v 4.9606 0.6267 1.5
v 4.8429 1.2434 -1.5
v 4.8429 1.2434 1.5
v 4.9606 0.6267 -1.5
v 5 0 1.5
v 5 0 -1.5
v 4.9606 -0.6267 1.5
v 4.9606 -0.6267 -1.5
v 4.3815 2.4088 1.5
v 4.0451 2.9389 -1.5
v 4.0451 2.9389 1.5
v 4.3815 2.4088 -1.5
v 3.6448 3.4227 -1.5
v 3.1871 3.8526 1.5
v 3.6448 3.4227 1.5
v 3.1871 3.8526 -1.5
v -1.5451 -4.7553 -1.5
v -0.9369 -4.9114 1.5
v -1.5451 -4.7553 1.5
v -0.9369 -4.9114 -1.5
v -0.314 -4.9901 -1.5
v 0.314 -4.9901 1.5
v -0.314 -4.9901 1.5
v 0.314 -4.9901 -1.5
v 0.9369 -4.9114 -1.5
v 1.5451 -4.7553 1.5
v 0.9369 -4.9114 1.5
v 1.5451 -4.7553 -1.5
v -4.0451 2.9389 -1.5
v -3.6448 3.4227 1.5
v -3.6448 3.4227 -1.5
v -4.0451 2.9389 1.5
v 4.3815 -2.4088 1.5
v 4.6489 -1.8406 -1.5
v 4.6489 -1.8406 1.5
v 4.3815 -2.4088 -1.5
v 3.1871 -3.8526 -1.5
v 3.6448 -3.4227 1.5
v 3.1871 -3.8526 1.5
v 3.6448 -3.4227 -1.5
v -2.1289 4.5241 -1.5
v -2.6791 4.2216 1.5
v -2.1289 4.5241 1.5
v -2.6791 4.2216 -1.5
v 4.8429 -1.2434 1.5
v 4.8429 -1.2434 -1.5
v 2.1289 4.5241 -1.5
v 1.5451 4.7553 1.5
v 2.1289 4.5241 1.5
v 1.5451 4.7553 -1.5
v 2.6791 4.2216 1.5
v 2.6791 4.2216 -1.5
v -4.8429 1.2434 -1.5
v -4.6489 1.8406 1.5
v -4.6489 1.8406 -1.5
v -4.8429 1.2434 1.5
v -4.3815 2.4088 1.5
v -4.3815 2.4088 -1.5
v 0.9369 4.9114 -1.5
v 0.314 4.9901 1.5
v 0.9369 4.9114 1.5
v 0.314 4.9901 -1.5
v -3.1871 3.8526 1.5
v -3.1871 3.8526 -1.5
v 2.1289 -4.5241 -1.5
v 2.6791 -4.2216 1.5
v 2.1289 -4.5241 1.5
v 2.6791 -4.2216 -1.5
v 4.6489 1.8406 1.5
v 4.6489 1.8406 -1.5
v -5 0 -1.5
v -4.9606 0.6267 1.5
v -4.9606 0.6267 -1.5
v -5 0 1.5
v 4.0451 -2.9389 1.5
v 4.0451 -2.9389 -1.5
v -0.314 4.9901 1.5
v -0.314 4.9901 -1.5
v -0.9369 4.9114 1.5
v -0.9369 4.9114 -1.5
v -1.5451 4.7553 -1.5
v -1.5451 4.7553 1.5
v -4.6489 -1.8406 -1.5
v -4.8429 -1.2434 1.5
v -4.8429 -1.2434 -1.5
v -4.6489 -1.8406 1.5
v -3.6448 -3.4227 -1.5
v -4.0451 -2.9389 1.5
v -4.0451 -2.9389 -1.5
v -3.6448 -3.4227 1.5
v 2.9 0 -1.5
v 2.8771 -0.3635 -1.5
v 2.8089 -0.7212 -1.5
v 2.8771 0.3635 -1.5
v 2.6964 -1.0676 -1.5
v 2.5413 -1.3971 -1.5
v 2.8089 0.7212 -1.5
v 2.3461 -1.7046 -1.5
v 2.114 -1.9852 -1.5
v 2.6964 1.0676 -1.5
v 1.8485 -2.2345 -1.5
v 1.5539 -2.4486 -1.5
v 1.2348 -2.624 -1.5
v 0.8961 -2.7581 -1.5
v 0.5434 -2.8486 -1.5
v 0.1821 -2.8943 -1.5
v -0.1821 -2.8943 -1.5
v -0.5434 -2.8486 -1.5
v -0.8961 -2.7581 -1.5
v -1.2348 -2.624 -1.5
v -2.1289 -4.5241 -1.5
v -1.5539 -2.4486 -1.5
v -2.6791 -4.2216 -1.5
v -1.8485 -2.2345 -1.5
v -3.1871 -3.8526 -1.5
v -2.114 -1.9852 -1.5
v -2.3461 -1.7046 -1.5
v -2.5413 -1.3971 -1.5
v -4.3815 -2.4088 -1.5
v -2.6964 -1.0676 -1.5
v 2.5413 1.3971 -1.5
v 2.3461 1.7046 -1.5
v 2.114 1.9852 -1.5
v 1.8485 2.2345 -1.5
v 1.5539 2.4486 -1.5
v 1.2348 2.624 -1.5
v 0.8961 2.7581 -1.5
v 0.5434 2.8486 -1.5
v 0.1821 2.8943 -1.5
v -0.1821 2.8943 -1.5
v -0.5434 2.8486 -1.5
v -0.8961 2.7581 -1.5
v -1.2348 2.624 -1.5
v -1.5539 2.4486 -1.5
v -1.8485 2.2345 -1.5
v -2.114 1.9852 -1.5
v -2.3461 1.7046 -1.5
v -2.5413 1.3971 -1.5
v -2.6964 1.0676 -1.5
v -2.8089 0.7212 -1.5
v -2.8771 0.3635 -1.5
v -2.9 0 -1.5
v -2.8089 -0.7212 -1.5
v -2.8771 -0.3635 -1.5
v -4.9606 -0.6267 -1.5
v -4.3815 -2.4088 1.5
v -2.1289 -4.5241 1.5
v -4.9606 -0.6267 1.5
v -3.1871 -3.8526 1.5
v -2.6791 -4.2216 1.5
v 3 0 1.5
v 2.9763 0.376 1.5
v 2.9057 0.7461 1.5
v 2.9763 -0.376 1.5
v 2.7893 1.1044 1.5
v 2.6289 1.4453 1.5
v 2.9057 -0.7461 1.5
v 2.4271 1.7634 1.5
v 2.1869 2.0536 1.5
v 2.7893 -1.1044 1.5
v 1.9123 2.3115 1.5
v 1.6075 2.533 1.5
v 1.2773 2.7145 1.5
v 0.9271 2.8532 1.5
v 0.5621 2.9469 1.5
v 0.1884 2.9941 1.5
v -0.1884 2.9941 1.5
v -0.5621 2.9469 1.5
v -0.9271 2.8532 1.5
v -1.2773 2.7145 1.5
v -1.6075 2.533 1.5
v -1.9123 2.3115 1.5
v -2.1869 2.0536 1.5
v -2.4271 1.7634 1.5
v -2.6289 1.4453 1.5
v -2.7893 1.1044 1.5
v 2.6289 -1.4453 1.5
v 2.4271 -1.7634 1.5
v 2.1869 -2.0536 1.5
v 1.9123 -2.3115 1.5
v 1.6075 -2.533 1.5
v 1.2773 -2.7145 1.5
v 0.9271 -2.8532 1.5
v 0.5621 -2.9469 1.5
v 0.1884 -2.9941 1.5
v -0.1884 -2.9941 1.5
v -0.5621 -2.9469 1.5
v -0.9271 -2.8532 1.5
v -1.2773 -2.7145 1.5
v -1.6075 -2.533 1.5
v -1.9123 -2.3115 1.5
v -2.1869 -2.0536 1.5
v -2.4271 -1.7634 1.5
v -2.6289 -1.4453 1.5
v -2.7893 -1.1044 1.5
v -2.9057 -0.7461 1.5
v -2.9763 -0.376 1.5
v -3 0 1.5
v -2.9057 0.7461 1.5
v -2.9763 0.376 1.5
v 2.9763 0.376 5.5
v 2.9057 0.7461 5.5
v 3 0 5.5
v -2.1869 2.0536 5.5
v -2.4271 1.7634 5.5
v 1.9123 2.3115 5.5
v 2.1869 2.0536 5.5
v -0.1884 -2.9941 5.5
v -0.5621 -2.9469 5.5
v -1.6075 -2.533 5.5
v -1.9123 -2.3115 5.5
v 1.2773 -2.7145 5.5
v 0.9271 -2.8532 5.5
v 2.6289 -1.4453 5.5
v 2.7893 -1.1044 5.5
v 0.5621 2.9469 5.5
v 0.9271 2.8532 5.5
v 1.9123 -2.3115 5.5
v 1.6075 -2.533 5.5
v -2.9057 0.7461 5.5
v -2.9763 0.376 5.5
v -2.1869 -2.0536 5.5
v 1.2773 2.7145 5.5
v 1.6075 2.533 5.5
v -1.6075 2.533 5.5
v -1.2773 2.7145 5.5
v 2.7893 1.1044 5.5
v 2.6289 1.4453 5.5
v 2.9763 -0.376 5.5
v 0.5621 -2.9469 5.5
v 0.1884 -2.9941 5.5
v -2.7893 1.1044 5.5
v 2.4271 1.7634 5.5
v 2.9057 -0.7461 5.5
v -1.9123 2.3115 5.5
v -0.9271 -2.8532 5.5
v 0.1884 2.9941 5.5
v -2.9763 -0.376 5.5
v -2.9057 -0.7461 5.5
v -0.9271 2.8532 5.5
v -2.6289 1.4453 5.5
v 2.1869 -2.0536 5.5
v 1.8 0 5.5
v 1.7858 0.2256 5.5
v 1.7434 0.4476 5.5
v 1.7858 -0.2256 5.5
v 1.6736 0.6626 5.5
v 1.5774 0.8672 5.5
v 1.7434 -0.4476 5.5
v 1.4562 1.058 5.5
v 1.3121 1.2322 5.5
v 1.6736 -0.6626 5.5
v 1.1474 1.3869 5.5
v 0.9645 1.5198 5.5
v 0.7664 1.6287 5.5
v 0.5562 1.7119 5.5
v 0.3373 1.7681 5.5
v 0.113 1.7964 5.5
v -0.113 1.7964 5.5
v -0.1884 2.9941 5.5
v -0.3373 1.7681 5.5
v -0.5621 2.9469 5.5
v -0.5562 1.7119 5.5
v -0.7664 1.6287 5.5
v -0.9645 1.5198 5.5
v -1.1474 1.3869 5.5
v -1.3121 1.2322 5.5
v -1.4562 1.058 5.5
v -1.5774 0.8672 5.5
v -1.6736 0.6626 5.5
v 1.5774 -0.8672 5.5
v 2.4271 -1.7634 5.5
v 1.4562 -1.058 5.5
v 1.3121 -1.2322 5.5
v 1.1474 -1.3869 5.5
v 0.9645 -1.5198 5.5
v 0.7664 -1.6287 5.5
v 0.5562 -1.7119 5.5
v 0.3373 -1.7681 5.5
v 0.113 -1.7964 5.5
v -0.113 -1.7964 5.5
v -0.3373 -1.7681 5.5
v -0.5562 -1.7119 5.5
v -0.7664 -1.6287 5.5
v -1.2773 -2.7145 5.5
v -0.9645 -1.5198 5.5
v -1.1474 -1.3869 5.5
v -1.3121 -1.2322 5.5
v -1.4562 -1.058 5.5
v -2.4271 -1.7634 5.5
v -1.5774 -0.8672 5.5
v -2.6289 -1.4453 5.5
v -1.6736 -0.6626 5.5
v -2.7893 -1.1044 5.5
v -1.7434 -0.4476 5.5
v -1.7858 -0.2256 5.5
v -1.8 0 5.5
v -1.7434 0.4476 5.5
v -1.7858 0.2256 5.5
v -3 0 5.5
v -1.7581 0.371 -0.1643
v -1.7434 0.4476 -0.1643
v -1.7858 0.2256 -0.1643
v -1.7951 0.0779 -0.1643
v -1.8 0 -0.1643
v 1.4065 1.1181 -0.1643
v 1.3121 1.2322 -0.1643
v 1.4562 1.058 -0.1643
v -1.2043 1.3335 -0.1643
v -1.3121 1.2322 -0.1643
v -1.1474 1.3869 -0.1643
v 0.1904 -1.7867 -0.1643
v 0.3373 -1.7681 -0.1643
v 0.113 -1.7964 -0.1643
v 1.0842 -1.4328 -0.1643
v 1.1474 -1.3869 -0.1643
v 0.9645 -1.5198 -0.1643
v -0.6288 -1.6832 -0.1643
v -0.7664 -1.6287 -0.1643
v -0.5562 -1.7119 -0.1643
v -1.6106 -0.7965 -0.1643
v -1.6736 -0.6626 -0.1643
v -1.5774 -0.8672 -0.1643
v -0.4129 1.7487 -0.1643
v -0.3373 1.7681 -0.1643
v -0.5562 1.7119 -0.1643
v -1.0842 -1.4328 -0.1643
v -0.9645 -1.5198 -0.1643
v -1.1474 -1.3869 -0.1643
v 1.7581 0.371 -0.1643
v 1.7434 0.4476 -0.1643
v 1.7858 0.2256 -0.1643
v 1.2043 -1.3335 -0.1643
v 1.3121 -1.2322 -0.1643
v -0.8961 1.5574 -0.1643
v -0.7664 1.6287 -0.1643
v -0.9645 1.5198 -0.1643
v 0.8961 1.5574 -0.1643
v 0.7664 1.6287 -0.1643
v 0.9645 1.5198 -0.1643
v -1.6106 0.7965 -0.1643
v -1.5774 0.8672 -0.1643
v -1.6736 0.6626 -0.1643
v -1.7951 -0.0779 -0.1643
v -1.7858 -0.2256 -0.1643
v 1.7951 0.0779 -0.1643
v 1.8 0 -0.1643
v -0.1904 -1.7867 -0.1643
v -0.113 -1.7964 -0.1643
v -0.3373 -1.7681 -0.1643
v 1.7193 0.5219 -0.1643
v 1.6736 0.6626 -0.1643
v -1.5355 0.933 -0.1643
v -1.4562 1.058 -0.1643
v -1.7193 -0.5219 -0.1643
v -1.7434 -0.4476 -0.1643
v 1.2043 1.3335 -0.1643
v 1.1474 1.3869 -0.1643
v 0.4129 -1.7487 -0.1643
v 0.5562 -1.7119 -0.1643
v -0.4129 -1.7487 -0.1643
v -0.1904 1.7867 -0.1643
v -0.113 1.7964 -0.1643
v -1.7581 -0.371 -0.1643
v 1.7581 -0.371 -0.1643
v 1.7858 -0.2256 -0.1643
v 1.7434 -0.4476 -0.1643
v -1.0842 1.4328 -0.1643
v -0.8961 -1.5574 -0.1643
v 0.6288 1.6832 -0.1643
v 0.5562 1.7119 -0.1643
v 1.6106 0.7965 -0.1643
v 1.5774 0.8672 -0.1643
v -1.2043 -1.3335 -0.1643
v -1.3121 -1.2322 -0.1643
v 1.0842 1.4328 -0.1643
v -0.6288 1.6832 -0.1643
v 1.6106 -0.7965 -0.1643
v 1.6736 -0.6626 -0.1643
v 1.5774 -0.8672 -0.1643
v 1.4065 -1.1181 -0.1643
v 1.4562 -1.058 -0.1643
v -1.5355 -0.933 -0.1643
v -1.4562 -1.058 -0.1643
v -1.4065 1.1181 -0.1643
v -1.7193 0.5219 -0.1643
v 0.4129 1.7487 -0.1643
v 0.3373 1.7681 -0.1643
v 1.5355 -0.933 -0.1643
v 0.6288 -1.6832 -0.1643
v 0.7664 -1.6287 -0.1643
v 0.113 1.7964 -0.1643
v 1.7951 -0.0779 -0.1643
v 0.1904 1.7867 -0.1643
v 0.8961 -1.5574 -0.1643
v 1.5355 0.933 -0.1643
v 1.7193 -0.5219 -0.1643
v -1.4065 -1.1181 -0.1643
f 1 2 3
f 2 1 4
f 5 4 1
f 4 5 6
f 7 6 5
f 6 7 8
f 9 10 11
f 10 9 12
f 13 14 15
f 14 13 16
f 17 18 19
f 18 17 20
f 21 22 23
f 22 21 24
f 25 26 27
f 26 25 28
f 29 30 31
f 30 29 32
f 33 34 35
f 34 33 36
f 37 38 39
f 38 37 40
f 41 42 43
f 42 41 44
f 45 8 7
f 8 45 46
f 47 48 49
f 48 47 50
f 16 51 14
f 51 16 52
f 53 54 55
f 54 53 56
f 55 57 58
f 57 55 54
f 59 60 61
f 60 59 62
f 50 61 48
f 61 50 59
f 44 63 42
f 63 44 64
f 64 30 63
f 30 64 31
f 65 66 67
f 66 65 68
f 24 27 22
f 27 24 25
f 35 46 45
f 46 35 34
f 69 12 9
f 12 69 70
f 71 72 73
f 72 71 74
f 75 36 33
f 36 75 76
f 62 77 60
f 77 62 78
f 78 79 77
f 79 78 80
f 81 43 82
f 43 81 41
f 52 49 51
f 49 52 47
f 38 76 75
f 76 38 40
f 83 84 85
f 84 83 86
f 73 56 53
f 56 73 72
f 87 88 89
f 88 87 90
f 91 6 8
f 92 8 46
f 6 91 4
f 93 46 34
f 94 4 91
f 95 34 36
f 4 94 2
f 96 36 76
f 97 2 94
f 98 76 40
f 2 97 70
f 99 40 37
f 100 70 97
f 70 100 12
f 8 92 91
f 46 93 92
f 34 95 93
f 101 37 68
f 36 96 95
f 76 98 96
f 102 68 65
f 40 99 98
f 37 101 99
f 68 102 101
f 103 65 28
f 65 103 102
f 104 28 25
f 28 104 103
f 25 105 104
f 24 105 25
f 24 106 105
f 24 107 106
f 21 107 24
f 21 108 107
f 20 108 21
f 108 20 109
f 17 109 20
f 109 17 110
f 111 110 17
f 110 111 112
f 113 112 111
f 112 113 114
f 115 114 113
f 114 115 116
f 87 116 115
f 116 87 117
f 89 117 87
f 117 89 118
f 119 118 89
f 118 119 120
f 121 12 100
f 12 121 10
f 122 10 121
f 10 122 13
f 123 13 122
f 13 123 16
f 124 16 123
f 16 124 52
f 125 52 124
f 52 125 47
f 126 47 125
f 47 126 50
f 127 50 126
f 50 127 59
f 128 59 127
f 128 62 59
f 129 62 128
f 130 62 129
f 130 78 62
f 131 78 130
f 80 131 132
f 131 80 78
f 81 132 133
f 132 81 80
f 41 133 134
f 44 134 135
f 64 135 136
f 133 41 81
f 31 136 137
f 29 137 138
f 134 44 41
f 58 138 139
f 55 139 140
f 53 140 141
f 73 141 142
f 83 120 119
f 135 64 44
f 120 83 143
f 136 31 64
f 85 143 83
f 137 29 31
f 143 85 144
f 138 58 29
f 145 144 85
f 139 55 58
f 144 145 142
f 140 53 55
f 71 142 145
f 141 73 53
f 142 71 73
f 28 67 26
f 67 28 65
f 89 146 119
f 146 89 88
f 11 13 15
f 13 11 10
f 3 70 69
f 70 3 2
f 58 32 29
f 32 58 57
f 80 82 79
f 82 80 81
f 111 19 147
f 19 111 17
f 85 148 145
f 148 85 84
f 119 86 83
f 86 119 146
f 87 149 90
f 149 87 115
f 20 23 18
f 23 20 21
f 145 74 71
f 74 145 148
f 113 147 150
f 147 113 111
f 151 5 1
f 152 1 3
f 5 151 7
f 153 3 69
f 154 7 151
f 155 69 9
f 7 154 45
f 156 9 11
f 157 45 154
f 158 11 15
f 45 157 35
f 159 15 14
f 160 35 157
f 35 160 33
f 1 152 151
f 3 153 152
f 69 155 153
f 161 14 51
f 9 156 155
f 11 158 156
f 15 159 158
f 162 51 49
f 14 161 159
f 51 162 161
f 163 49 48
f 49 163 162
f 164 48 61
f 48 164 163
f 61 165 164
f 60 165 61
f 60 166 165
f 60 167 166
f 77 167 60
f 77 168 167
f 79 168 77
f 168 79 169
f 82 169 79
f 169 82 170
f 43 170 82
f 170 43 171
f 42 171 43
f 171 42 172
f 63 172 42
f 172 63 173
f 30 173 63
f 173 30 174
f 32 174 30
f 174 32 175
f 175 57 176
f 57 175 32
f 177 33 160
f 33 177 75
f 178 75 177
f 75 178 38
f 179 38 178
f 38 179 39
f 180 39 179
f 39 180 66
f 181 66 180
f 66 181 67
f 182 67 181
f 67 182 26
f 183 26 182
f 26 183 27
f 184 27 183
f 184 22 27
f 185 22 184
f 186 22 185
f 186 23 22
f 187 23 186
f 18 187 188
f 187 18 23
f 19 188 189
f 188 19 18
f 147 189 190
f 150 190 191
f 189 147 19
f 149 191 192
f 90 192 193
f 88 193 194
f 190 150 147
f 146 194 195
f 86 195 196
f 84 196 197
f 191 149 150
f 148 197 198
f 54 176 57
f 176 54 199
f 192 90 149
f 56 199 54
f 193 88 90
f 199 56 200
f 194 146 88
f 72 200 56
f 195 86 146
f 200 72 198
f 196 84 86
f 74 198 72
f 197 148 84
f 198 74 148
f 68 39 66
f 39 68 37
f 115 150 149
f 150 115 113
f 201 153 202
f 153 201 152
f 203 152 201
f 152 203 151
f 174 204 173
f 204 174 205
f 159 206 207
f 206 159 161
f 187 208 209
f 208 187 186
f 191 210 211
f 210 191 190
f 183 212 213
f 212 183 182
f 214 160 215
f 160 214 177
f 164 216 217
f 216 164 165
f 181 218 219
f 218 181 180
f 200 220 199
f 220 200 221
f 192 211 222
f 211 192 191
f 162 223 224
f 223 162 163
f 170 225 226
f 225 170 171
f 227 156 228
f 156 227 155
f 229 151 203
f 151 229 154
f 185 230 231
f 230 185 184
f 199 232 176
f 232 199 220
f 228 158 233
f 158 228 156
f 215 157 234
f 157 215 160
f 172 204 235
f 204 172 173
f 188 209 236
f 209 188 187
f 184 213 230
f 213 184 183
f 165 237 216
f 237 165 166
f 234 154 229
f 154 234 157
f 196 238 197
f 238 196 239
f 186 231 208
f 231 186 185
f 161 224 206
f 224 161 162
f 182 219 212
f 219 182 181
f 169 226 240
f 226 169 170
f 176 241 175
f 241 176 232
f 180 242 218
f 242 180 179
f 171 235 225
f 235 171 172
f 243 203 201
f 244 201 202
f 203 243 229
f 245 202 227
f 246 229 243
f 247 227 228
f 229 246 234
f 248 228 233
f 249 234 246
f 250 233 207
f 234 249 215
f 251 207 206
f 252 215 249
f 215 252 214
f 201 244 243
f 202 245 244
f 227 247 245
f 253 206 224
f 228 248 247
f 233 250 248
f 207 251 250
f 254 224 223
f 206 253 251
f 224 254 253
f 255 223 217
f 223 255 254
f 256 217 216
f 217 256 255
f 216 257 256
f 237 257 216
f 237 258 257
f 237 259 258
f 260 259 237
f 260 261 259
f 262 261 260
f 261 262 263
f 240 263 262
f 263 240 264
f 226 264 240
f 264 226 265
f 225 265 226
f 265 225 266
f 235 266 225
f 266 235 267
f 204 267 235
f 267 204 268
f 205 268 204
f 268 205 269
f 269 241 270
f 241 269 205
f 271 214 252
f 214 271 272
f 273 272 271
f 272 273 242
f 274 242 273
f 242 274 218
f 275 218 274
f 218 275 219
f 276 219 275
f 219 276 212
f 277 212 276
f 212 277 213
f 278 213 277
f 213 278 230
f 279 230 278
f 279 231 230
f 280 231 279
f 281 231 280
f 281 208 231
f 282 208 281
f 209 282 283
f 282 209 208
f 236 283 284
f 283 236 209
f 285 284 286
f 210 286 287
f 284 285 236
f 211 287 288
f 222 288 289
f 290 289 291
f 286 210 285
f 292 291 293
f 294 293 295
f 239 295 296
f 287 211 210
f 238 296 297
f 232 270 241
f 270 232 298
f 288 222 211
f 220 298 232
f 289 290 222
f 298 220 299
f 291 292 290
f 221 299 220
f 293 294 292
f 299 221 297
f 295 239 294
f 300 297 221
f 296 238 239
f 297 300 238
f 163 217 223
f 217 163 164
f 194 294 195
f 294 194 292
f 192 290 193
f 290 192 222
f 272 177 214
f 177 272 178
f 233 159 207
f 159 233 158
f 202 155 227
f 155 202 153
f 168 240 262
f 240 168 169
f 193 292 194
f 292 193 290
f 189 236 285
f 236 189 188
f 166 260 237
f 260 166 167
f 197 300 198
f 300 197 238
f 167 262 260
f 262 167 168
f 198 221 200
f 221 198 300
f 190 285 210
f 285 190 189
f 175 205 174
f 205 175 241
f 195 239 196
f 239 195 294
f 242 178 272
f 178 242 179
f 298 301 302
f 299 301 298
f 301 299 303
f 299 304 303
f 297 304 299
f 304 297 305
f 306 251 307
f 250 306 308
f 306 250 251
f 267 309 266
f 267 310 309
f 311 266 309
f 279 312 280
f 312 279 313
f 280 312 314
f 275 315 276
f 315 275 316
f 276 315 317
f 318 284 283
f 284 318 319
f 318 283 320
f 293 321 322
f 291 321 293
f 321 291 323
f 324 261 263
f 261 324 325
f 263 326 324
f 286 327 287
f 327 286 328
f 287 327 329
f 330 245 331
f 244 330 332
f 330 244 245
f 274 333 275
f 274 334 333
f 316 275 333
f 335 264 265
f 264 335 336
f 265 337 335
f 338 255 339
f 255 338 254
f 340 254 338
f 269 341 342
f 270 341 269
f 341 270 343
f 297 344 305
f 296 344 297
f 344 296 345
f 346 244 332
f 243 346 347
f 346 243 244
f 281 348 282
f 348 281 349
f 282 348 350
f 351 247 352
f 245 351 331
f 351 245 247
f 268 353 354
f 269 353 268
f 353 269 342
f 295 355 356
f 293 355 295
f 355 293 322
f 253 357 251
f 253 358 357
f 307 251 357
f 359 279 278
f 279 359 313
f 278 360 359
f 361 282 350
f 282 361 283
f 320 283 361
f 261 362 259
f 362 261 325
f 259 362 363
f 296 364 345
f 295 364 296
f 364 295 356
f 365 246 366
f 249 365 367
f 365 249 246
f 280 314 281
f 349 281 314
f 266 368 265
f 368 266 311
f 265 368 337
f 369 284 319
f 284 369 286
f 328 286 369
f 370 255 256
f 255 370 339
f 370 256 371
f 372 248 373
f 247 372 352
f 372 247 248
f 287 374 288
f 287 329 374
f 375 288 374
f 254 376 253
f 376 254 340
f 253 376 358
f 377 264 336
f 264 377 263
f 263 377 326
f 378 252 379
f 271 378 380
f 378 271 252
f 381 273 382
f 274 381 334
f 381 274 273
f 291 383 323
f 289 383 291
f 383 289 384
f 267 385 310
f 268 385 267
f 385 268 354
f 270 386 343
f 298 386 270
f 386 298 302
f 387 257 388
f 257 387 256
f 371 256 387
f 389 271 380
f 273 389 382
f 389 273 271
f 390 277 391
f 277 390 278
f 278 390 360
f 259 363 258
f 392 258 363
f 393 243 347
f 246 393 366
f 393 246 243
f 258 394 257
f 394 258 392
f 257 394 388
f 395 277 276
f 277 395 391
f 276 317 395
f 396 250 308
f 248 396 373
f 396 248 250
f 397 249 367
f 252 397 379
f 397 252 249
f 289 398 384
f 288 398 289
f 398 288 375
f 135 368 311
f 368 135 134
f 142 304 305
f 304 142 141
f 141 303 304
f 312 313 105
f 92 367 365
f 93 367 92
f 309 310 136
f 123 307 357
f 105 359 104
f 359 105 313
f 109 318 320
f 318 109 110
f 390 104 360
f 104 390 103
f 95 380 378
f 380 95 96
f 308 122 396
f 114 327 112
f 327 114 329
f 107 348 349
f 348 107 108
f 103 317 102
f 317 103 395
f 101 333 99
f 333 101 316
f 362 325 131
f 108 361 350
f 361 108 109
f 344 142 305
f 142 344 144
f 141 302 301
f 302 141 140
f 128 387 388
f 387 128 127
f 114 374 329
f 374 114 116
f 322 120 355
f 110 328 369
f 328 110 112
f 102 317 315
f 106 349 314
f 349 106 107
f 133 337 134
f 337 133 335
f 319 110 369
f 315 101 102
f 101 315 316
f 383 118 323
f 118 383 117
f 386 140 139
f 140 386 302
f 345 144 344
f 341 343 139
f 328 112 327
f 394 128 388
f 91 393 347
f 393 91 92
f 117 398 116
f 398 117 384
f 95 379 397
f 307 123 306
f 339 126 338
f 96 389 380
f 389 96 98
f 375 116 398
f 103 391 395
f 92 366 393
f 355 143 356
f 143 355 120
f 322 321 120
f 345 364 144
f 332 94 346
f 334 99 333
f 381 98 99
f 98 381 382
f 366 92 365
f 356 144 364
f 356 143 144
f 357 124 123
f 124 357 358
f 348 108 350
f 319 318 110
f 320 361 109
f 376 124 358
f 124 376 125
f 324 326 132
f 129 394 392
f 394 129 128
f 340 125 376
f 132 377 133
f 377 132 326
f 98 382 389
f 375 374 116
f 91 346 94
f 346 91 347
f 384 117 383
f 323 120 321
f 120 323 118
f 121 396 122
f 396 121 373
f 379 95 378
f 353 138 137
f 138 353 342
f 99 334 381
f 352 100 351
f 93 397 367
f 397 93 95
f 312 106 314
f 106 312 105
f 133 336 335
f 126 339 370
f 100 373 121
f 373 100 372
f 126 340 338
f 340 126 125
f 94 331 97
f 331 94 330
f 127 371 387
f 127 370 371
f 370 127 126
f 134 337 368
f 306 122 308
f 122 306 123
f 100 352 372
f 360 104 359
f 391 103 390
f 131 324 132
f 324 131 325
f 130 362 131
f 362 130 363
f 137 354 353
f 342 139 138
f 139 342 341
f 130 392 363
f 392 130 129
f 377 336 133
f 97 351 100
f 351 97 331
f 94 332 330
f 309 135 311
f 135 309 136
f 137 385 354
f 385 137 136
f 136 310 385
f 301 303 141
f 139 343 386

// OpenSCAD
$fn = 50;


difference() {
	union() {
		translate(v = [0, 0, -1.5000000000]) {
			cylinder(h = 3, r = 5.0000000000);
		}
		translate(v = [0, 0, -1.5000000000]) {
			cylinder(h = 7, r = 3.0000000000);
		}
	}
	union() {
		translate(v = [0, 0, -1.5000000000]) {
			rotate(a = [0, 180, 0]) {
				difference() {
					union() {
						translate(v = [0, 0, -7.0000000000]) {
							cylinder(h = 7, r = 1.5000000000);
						}
						translate(v = [0, 0, -7.0000000000]) {
							cylinder(h = 7, r = 1.8000000000);
						}
						translate(v = [0, 0, -1.7000000000]) {
							cylinder(h = 1.7000000000, r1 = 1.5000000000, r2 = 2.9000000000);
						}
						translate(v = [0, 0, -7.0000000000]) {
							cylinder(h = 7, r = 1.5000000000);
						}
					}
					union();
				}
			}
		}
		translate(v = [0, 0, -100.0000000000]) {
			cylinder(h = 200, r = 1.5000000000);
		}
	}
}
